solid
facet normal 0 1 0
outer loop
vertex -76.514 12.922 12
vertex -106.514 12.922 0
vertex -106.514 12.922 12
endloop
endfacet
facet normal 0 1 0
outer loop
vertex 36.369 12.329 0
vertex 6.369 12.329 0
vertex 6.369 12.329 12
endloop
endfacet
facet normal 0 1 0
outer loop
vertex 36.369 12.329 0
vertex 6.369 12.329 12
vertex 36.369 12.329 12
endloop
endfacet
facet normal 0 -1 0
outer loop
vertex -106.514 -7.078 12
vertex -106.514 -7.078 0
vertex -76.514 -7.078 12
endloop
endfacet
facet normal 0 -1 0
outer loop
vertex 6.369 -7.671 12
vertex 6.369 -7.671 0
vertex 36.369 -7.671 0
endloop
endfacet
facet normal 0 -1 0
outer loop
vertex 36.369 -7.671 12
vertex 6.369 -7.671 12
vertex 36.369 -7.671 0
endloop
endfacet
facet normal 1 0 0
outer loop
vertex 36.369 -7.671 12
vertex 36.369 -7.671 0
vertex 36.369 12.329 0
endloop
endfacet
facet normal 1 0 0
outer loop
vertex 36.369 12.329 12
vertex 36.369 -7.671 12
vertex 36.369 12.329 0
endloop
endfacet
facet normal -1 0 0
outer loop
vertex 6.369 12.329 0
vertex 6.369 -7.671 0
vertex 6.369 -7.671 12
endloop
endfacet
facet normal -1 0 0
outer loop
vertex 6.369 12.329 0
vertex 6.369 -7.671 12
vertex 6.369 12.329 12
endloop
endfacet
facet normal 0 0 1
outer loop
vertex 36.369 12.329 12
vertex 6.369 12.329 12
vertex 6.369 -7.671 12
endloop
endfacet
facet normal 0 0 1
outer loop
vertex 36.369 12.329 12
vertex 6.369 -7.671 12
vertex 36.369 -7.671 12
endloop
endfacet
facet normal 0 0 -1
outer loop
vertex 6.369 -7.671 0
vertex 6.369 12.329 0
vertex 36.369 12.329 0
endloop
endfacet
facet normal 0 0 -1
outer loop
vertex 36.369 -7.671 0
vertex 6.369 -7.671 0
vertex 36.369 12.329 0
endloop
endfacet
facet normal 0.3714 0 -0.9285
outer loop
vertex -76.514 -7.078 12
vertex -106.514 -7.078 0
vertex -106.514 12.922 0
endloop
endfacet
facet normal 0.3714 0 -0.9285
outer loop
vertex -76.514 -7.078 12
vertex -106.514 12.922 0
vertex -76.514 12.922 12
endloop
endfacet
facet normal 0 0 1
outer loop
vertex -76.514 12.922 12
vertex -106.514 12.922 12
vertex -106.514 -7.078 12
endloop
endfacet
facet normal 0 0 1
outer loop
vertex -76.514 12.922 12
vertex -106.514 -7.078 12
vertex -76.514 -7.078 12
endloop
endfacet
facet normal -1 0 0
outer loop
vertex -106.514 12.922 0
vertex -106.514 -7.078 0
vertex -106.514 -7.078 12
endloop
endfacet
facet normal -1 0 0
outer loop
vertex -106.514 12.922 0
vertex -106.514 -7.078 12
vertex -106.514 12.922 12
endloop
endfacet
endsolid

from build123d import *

# Parameters (mm, degrees)
F0_W     = 30
F0_H     = 20
F1_DEPTH = 12
F3_DEPTH = 20


with BuildPart() as f1:
    # F0 (on Top) → F1 (new body)
    with BuildSketch(Plane.XY):
        with Locations((-91.5137013793, 2.9215582088)):
            Rectangle(F0_W, F0_H)
    extrude(amount=F1_DEPTH)

    # F2 (on face) → F3 (intersect)
    with BuildSketch(Plane.XZ.offset(7.0784417912)):
        Polygon((-106.5137013793, 12), (-106.5137013793, 0), (-76.5137013793, 12), align=None)
    extrude(amount=-F3_DEPTH, mode=Mode.INTERSECT)


with BuildPart() as f1b:
    # F0 (on Top) → F1, piece 2 (new body)
    with BuildSketch(Plane.XY):
        with Locations((21.369265262, 2.3289385624)):
            Rectangle(F0_W, F0_H)
    extrude(amount=F1_DEPTH)


solid = Compound([f1.part, f1b.part])
